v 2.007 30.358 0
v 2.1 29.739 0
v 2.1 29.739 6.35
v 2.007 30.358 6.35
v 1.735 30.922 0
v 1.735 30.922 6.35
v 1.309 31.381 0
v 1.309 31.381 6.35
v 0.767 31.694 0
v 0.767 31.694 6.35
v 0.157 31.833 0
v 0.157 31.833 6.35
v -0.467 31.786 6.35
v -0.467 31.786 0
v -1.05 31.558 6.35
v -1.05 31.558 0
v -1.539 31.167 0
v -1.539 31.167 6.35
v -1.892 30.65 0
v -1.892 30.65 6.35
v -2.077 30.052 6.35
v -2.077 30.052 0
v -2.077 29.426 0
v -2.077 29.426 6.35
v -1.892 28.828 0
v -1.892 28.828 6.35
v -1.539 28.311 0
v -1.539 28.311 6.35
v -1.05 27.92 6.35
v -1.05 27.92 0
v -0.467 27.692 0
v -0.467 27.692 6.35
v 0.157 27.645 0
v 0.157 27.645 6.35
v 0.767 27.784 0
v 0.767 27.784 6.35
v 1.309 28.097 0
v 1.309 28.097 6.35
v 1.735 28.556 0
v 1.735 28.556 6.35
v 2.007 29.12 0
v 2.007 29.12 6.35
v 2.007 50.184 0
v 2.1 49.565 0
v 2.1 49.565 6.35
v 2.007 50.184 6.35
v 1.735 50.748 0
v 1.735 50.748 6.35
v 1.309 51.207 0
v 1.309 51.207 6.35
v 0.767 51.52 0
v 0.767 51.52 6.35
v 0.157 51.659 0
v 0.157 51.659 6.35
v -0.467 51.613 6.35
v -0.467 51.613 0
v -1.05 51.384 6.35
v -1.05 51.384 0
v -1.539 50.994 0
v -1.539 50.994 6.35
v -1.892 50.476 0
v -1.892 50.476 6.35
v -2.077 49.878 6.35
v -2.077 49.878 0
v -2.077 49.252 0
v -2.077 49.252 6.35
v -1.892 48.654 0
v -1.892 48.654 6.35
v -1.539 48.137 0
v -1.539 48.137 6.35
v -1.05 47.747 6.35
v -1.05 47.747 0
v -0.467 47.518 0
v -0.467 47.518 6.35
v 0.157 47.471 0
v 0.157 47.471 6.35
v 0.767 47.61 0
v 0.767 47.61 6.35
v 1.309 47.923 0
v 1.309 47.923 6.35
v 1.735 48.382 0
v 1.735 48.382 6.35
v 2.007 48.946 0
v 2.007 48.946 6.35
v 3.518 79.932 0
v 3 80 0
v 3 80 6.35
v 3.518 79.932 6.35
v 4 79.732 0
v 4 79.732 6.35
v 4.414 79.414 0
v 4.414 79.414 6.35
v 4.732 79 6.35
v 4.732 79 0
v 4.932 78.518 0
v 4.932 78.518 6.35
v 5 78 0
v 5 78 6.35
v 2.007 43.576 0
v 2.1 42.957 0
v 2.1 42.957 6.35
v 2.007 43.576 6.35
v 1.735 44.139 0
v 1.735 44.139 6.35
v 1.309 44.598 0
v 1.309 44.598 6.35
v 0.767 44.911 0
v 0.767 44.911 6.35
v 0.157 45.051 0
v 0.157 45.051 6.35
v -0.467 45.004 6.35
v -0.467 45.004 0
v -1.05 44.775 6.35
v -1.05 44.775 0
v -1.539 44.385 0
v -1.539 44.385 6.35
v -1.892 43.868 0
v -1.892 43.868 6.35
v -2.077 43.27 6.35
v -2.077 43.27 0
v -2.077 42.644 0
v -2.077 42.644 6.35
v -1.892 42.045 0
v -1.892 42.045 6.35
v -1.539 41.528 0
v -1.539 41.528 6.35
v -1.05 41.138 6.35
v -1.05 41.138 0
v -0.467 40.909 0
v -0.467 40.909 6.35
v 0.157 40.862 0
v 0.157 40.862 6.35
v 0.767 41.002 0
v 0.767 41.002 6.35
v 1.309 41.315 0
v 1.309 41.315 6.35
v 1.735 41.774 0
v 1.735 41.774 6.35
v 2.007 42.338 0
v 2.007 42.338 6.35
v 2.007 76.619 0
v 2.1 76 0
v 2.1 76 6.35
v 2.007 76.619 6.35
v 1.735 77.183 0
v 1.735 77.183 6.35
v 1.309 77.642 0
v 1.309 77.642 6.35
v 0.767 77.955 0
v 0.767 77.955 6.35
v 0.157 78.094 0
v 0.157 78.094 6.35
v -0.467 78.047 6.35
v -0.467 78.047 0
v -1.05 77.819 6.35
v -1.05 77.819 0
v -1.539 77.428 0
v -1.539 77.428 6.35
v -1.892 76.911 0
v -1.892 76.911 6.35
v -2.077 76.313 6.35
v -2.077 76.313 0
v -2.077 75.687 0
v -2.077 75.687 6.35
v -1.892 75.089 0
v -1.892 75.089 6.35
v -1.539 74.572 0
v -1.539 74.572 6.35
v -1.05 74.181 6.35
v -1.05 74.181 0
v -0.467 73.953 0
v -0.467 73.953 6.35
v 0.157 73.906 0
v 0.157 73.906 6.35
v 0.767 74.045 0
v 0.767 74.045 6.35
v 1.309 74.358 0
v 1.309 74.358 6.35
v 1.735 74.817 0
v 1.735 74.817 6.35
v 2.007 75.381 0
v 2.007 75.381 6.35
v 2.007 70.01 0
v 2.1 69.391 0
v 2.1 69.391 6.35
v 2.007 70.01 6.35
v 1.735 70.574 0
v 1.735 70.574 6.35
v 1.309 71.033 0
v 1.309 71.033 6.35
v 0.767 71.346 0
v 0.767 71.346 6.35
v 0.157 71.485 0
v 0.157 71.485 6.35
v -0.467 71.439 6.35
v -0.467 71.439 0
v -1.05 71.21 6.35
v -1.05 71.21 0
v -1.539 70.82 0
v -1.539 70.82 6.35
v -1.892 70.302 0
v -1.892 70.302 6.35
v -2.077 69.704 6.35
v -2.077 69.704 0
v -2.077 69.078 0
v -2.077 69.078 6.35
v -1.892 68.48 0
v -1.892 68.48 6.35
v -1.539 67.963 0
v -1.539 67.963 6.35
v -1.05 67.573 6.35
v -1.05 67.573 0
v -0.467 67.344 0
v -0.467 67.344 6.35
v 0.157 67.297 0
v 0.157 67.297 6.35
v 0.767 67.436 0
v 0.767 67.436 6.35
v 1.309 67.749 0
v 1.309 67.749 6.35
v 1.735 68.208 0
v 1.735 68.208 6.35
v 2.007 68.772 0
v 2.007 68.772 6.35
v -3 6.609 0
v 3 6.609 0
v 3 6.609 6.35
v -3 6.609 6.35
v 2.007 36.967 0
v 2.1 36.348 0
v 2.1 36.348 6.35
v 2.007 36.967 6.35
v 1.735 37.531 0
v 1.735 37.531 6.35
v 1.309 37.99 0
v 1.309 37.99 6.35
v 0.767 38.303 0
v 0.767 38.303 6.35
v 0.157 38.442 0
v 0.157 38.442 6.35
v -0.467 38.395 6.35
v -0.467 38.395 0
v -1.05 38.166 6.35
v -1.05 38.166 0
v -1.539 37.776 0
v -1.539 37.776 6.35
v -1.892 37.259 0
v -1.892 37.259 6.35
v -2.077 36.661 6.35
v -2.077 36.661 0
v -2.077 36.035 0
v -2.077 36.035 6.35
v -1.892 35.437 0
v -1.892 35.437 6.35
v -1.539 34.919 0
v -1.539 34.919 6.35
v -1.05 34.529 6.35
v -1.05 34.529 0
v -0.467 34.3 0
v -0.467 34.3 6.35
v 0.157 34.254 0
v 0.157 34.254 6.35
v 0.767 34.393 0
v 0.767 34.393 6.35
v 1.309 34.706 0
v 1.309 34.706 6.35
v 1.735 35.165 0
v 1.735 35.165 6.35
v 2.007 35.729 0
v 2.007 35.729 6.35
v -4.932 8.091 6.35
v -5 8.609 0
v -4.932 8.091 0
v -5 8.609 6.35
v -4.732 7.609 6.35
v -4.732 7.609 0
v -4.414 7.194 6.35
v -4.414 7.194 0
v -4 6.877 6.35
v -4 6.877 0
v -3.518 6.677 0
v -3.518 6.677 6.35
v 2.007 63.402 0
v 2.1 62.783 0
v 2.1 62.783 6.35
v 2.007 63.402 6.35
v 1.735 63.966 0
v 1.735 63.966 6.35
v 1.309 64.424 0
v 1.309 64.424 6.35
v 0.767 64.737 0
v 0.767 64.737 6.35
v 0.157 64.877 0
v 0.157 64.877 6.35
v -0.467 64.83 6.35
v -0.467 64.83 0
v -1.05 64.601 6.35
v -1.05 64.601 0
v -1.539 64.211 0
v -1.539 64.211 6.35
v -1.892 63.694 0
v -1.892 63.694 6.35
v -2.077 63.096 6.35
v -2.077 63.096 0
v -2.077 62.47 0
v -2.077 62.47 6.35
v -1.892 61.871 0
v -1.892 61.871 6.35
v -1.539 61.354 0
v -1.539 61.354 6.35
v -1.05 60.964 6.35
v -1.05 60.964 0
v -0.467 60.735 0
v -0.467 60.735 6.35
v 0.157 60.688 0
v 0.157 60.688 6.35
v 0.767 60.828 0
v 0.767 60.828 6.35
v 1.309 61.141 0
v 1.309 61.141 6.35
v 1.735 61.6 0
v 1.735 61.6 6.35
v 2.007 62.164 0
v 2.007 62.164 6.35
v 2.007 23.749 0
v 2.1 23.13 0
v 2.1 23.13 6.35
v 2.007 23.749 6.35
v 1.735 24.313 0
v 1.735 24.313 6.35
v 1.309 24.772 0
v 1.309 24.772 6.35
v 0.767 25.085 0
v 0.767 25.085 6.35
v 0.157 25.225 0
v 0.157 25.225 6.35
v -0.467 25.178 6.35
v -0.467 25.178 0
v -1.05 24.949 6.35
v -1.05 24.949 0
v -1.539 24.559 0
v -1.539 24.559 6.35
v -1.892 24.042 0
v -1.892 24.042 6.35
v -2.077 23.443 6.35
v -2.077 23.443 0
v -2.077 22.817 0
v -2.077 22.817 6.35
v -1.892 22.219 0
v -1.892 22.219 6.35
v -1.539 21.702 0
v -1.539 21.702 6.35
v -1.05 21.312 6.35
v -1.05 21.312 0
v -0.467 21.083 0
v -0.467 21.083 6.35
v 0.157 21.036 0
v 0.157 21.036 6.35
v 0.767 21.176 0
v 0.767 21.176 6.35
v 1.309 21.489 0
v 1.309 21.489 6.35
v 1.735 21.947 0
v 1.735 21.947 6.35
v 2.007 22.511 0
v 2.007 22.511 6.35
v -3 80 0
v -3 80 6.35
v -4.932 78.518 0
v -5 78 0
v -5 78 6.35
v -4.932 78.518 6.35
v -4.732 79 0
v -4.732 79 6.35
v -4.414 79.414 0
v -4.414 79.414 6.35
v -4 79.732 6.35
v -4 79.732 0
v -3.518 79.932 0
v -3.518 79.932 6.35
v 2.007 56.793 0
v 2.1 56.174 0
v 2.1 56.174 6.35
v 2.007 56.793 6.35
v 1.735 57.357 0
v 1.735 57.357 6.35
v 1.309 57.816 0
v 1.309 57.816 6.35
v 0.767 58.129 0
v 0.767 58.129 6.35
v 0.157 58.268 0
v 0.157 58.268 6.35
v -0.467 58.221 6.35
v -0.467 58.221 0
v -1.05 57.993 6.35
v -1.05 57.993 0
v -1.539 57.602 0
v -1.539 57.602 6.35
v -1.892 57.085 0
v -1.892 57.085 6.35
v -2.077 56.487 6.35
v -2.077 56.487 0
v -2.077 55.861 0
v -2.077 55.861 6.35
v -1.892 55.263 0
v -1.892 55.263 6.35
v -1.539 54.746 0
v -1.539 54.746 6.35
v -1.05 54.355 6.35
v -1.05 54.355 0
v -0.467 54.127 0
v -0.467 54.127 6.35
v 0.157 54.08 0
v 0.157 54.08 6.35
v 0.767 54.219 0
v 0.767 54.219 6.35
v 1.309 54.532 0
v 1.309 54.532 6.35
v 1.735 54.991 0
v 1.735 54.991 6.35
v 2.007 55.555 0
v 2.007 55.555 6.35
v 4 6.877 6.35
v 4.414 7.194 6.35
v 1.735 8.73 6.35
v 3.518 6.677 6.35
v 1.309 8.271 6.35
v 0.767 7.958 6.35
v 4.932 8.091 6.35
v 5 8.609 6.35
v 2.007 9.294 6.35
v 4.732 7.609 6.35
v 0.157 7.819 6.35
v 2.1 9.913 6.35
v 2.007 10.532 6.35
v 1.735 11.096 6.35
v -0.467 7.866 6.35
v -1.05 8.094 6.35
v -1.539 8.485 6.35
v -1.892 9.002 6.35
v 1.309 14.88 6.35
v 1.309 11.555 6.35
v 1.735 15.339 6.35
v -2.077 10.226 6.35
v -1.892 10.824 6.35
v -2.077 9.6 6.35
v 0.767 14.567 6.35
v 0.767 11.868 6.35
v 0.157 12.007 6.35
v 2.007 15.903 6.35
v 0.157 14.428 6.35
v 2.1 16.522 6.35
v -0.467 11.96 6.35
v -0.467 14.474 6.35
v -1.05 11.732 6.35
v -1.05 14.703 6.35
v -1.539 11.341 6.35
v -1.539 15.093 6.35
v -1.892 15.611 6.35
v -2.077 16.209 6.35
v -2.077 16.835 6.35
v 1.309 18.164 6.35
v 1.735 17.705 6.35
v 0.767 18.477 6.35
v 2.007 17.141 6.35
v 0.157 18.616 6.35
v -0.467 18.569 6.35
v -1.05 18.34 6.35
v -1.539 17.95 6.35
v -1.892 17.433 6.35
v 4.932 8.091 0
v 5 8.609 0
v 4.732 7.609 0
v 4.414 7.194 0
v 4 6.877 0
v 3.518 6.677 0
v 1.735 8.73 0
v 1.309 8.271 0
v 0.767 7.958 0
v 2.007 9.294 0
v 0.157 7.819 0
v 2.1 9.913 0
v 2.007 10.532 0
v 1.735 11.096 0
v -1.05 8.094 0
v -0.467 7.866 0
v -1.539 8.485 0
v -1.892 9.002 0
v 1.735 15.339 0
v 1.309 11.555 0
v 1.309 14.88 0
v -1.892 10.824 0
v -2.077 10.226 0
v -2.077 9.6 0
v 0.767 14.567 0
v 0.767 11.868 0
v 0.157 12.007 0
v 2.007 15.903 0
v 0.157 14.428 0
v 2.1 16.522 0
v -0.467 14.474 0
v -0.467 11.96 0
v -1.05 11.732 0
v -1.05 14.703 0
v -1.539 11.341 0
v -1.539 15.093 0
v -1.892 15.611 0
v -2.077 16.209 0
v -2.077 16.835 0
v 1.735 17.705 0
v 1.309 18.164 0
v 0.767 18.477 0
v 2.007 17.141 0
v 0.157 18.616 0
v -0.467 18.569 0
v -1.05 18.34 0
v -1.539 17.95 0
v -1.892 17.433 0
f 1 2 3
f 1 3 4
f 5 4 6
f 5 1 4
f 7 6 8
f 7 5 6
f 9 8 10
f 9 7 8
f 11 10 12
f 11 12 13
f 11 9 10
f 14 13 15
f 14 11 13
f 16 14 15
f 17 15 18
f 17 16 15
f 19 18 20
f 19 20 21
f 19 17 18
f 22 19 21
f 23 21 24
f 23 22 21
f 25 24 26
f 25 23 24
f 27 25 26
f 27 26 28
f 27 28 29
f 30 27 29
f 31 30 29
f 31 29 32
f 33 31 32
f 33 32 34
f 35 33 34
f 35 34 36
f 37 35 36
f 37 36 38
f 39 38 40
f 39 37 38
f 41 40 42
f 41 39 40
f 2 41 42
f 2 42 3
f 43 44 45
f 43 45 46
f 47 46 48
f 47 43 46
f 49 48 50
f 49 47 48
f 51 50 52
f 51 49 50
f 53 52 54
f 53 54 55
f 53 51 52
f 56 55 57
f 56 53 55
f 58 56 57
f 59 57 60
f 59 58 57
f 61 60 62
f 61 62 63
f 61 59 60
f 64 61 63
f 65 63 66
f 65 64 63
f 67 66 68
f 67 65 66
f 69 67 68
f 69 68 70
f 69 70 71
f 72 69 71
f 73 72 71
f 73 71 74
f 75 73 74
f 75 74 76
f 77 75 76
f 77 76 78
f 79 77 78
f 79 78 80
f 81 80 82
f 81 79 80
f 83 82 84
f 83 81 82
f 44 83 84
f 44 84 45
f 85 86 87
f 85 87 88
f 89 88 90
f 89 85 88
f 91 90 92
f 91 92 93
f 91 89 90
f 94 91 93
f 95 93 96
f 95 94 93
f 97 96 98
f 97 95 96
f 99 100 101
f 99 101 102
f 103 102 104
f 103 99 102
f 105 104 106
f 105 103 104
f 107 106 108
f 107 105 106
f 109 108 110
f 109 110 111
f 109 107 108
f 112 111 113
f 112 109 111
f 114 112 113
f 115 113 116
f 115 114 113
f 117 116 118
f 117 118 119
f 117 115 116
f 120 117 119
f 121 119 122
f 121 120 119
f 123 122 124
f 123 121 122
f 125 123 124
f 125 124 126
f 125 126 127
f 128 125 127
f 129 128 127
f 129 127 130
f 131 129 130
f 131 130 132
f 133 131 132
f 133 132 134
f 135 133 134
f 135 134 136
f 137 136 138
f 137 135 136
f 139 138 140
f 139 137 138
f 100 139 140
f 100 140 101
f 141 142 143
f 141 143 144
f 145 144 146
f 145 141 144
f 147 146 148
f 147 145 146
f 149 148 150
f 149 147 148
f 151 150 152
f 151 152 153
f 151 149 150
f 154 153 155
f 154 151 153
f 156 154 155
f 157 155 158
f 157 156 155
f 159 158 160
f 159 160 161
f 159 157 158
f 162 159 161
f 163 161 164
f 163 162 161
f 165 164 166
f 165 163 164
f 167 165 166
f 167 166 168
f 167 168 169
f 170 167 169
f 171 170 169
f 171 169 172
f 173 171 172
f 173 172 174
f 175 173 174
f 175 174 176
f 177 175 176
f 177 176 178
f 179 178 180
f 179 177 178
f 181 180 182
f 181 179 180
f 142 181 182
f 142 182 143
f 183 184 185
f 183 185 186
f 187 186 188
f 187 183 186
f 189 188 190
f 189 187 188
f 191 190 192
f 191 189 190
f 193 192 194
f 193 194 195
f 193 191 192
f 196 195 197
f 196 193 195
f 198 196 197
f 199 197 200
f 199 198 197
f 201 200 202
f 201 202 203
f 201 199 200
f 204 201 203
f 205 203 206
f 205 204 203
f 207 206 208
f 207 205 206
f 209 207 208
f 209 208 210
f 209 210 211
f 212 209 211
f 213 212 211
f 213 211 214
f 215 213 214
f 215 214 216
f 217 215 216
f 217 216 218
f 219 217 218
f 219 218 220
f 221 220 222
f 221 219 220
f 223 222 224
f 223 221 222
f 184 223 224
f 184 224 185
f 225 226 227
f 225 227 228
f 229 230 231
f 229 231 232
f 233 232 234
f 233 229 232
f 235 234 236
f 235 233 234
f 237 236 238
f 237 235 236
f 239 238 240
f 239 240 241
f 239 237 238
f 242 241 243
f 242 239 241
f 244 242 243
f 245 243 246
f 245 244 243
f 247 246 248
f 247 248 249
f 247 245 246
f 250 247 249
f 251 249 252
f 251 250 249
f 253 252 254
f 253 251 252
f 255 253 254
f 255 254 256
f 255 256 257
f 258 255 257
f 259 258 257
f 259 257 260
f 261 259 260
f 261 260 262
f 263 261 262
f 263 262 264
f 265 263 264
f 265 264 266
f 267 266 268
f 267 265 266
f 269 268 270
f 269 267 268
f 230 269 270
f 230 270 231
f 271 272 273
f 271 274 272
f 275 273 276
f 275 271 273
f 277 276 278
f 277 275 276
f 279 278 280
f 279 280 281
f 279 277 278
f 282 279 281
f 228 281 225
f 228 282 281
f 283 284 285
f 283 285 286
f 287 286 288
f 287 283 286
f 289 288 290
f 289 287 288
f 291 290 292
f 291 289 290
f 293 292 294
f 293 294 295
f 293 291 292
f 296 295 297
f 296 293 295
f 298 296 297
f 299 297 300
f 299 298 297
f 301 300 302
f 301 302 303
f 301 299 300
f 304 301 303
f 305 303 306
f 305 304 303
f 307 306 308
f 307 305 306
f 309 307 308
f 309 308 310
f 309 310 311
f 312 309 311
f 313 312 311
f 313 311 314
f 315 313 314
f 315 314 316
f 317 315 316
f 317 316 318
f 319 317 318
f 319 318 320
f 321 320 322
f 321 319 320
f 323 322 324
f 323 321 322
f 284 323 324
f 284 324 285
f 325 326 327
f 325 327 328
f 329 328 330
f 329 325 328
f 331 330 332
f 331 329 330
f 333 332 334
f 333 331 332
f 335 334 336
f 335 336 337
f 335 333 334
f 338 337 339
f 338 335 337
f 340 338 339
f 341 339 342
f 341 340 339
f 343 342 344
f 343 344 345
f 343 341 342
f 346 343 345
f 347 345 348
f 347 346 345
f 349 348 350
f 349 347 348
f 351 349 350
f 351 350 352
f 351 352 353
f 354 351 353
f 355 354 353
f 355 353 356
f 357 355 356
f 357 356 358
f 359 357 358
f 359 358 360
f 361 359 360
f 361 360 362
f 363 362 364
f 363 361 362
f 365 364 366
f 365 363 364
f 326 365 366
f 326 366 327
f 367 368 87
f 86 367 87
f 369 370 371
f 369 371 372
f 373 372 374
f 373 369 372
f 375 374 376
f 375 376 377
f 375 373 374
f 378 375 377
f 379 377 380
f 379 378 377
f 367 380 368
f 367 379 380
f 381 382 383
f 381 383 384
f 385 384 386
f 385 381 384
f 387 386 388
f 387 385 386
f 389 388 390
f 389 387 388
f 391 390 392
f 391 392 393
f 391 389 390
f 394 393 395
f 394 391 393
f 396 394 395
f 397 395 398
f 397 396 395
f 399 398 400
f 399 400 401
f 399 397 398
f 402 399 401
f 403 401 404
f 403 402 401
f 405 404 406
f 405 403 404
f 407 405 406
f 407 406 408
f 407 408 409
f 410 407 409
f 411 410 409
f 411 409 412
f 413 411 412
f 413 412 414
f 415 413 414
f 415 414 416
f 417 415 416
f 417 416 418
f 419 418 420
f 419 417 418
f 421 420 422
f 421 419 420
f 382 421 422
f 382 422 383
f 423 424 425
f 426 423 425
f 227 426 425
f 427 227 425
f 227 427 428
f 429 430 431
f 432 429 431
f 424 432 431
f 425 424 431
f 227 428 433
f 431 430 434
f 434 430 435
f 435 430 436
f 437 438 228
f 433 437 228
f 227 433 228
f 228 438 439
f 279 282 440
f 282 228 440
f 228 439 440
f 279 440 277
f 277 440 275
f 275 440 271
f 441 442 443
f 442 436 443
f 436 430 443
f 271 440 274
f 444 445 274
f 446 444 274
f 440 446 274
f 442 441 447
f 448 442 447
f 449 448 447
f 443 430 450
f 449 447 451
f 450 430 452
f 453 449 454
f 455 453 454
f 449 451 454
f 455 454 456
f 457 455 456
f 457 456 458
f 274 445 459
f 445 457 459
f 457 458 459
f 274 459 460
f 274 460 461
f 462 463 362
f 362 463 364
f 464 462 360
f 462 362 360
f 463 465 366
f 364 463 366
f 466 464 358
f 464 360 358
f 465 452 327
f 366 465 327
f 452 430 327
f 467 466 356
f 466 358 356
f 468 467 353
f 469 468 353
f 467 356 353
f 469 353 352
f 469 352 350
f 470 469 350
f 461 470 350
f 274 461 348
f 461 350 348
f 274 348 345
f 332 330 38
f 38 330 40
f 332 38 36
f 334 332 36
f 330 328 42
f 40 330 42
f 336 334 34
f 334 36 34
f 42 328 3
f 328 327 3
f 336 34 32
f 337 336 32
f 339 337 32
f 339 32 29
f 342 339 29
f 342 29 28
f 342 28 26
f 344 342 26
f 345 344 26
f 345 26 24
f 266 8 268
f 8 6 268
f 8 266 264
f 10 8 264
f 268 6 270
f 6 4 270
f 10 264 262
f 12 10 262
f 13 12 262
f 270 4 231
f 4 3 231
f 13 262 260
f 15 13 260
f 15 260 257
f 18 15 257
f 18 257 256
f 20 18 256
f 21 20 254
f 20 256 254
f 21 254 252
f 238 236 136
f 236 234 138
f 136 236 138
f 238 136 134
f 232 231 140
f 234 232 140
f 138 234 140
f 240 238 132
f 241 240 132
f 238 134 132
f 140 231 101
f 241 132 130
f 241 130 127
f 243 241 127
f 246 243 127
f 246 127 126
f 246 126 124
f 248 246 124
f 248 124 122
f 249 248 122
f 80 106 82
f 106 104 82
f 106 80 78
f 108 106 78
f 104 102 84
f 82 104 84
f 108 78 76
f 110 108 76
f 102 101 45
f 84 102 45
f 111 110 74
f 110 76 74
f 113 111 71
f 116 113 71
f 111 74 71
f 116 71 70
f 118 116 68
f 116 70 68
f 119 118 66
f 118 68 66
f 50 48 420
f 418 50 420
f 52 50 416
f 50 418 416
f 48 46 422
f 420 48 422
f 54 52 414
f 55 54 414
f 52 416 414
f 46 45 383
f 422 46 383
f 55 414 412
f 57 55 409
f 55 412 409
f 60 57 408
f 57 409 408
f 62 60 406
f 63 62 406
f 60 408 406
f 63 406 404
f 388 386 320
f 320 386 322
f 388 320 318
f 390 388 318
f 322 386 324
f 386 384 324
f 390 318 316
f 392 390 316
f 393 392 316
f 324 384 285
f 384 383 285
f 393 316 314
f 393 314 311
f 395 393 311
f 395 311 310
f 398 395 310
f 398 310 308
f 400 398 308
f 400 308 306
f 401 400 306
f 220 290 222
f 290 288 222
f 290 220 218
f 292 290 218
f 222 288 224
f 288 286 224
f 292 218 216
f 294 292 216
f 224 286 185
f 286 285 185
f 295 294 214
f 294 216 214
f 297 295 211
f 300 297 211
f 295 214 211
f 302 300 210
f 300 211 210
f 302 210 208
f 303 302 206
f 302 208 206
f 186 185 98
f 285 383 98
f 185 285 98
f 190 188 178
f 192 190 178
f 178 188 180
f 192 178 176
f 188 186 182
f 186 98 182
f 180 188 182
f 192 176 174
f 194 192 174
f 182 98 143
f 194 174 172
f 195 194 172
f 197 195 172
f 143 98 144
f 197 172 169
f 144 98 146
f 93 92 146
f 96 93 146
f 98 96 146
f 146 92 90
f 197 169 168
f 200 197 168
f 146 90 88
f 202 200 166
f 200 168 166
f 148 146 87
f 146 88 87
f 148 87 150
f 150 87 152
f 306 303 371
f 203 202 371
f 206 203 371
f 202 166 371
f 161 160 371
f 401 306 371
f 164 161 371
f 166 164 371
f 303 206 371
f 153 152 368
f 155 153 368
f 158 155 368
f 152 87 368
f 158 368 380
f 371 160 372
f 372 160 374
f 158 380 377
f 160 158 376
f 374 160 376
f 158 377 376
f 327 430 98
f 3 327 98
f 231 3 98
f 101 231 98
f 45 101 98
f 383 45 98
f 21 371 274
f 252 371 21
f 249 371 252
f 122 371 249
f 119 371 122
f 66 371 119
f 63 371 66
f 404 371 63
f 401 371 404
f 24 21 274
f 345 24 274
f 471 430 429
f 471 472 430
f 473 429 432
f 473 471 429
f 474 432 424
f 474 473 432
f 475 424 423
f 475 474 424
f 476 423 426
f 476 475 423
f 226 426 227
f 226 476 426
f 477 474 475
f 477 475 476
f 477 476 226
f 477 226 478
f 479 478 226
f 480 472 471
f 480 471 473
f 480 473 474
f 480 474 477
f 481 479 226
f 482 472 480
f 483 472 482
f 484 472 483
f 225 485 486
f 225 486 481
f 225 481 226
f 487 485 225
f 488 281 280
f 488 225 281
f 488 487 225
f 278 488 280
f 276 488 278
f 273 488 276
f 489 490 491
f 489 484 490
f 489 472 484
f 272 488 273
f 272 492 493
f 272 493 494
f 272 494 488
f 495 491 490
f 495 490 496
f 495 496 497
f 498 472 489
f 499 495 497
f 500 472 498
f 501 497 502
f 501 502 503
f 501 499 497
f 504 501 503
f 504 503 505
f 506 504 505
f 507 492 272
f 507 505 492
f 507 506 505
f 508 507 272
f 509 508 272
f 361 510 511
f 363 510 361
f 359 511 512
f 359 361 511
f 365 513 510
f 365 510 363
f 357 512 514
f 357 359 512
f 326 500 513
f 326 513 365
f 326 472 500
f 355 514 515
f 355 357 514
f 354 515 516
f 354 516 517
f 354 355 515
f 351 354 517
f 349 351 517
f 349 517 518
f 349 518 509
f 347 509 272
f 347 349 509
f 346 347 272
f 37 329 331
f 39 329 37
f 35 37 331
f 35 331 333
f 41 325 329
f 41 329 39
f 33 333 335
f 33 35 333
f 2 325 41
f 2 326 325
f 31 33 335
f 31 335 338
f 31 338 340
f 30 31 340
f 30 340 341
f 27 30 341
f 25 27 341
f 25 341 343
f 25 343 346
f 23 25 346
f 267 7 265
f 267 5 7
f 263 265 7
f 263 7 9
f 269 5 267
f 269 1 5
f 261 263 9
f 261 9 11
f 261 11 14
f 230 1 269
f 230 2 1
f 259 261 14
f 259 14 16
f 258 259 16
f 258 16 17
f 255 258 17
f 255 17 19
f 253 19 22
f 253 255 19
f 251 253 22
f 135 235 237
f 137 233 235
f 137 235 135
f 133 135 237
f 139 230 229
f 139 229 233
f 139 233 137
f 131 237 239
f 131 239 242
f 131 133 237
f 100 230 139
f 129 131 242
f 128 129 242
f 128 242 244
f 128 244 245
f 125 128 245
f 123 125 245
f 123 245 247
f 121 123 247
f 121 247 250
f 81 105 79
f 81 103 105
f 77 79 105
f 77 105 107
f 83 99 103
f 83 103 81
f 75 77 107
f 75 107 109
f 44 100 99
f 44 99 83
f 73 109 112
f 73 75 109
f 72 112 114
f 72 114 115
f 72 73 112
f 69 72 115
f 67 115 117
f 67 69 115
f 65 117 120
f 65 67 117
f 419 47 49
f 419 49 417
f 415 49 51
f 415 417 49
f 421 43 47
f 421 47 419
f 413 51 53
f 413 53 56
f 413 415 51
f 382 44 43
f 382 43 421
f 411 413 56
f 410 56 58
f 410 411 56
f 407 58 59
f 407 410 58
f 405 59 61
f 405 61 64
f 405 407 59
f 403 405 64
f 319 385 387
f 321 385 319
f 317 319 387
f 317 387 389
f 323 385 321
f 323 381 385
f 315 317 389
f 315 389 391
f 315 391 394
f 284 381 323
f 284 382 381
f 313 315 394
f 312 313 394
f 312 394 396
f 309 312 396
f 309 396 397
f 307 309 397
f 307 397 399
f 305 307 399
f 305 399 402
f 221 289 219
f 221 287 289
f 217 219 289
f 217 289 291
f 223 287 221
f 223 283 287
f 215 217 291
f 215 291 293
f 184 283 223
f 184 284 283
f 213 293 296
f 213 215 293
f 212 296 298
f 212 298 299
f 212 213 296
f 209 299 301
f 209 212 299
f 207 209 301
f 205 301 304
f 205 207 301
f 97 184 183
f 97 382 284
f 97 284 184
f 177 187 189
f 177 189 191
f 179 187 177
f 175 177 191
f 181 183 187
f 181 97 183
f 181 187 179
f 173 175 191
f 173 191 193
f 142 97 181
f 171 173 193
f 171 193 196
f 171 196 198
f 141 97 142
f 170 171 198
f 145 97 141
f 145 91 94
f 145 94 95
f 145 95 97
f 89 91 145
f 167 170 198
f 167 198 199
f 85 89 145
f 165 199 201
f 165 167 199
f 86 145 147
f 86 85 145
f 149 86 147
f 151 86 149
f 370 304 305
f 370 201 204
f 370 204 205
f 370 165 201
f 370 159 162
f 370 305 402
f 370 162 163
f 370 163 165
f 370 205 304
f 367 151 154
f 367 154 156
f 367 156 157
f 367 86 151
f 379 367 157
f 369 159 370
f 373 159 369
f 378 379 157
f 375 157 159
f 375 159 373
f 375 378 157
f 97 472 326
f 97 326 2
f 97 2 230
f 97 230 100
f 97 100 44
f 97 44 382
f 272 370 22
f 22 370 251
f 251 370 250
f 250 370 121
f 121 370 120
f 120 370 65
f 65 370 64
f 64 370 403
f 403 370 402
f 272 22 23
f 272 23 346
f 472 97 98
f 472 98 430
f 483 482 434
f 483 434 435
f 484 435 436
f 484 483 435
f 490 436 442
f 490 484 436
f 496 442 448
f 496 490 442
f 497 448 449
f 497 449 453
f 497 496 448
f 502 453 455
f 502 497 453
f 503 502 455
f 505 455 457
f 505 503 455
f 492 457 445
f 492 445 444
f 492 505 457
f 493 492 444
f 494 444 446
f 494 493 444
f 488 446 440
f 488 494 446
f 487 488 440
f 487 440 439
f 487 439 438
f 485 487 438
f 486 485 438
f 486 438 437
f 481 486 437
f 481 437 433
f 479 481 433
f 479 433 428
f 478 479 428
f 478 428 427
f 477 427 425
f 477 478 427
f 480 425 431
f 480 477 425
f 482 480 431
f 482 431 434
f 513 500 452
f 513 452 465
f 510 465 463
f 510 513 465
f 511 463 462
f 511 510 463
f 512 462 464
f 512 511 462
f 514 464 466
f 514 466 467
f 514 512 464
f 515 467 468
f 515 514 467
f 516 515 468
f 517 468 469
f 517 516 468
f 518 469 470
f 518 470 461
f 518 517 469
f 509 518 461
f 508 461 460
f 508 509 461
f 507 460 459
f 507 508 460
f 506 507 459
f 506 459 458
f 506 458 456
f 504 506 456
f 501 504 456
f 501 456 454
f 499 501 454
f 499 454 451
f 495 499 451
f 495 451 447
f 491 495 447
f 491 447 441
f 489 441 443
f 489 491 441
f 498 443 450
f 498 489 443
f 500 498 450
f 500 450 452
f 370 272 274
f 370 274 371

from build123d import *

# Parameters (mm, degrees)
SKETCH1_R           = 2.1
BOSS_EXTRUDE1_DEPTH = 6.35
SKETCH2_W           = 18.204542204
SKETCH2_H           = 91.842735445
CUT_EXTRUDE1_DEPTH  = 81.407229153
FILLET2_R           = 2


with BuildPart() as part:
    # Sketch1 → Boss-Extrude1 (new body)
    with BuildSketch(Plane.XY):
        with BuildLine():
            Line((3, -80), (-3, -80))
            ThreePointArc((-3, -80), (-4.414213562, -79.414213562), (-5, -78))
            Line((-5, -78), (-5, 78))
            ThreePointArc((-5, 78), (-4.414213562, 79.414213562), (-3, 80))
            Line((-3, 80), (3, 80))
            ThreePointArc((3, 80), (4.414213562, 79.414213562), (5, 78))
            Line((5, 78), (5, -78))
            ThreePointArc((5, -78), (4.414213562, -79.414213562), (3, -80))
        make_face()
        with Locations((0, 76)):
            Circle(SKETCH1_R, mode=Mode.SUBTRACT)
        with Locations((0, 69.391304348)):
            Circle(SKETCH1_R, mode=Mode.SUBTRACT)
        with Locations((0, 62.782608696)):
            Circle(SKETCH1_R, mode=Mode.SUBTRACT)
        with Locations((0, 56.173913043)):
            Circle(SKETCH1_R, mode=Mode.SUBTRACT)
        with Locations((0, 49.565217391)):
            Circle(SKETCH1_R, mode=Mode.SUBTRACT)
        with Locations((0, 42.956521739)):
            Circle(SKETCH1_R, mode=Mode.SUBTRACT)
        with Locations((0, 36.347826087)):
            Circle(SKETCH1_R, mode=Mode.SUBTRACT)
        with Locations((0, 29.739130435)):
            Circle(SKETCH1_R, mode=Mode.SUBTRACT)
        with Locations((0, 23.130434783)):
            Circle(SKETCH1_R, mode=Mode.SUBTRACT)
        with Locations((0, 16.52173913)):
            Circle(SKETCH1_R, mode=Mode.SUBTRACT)
        with Locations((0, 9.913043478)):
            Circle(SKETCH1_R, mode=Mode.SUBTRACT)
        with Locations((0, 3.304347826)):
            Circle(SKETCH1_R, mode=Mode.SUBTRACT)
        with Locations((0, -3.304347826)):
            Circle(SKETCH1_R, mode=Mode.SUBTRACT)
        with Locations((0, -9.913043478)):
            Circle(SKETCH1_R, mode=Mode.SUBTRACT)
        with Locations((0, -16.52173913)):
            Circle(SKETCH1_R, mode=Mode.SUBTRACT)
        with Locations((0, -23.130434783)):
            Circle(SKETCH1_R, mode=Mode.SUBTRACT)
        with Locations((0, -29.739130435)):
            Circle(SKETCH1_R, mode=Mode.SUBTRACT)
        with Locations((0, -36.347826087)):
            Circle(SKETCH1_R, mode=Mode.SUBTRACT)
        with Locations((0, -42.956521739)):
            Circle(SKETCH1_R, mode=Mode.SUBTRACT)
        with Locations((0, -49.565217391)):
            Circle(SKETCH1_R, mode=Mode.SUBTRACT)
        with Locations((0, -56.173913043)):
            Circle(SKETCH1_R, mode=Mode.SUBTRACT)
        with Locations((0, -62.782608696)):
            Circle(SKETCH1_R, mode=Mode.SUBTRACT)
        with Locations((0, -69.391304348)):
            Circle(SKETCH1_R, mode=Mode.SUBTRACT)
        with Locations((0, -76)):
            Circle(SKETCH1_R, mode=Mode.SUBTRACT)
    extrude(amount=BOSS_EXTRUDE1_DEPTH)

    # Sketch2 → Cut-Extrude1 (cut, through all)
    with BuildSketch(Plane(origin=(0, 0, 0), x_dir=(-1, 0, 0), z_dir=(0, 0, -1))):
        with Locations((-0.246007327, -39.312672071)):
            Rectangle(SKETCH2_W, SKETCH2_H)
    extrude(amount=-CUT_EXTRUDE1_DEPTH, mode=Mode.SUBTRACT)

    # Fillet2
    fillet2_edges = [part.edges().sort_by_distance(p)[0] for p in [
        (-5, 6.608695652, 3.175),
        (5, 6.608695652, 3.175),
    ]]
    fillet(fillet2_edges, radius=FILLET2_R)


solid = part.part
